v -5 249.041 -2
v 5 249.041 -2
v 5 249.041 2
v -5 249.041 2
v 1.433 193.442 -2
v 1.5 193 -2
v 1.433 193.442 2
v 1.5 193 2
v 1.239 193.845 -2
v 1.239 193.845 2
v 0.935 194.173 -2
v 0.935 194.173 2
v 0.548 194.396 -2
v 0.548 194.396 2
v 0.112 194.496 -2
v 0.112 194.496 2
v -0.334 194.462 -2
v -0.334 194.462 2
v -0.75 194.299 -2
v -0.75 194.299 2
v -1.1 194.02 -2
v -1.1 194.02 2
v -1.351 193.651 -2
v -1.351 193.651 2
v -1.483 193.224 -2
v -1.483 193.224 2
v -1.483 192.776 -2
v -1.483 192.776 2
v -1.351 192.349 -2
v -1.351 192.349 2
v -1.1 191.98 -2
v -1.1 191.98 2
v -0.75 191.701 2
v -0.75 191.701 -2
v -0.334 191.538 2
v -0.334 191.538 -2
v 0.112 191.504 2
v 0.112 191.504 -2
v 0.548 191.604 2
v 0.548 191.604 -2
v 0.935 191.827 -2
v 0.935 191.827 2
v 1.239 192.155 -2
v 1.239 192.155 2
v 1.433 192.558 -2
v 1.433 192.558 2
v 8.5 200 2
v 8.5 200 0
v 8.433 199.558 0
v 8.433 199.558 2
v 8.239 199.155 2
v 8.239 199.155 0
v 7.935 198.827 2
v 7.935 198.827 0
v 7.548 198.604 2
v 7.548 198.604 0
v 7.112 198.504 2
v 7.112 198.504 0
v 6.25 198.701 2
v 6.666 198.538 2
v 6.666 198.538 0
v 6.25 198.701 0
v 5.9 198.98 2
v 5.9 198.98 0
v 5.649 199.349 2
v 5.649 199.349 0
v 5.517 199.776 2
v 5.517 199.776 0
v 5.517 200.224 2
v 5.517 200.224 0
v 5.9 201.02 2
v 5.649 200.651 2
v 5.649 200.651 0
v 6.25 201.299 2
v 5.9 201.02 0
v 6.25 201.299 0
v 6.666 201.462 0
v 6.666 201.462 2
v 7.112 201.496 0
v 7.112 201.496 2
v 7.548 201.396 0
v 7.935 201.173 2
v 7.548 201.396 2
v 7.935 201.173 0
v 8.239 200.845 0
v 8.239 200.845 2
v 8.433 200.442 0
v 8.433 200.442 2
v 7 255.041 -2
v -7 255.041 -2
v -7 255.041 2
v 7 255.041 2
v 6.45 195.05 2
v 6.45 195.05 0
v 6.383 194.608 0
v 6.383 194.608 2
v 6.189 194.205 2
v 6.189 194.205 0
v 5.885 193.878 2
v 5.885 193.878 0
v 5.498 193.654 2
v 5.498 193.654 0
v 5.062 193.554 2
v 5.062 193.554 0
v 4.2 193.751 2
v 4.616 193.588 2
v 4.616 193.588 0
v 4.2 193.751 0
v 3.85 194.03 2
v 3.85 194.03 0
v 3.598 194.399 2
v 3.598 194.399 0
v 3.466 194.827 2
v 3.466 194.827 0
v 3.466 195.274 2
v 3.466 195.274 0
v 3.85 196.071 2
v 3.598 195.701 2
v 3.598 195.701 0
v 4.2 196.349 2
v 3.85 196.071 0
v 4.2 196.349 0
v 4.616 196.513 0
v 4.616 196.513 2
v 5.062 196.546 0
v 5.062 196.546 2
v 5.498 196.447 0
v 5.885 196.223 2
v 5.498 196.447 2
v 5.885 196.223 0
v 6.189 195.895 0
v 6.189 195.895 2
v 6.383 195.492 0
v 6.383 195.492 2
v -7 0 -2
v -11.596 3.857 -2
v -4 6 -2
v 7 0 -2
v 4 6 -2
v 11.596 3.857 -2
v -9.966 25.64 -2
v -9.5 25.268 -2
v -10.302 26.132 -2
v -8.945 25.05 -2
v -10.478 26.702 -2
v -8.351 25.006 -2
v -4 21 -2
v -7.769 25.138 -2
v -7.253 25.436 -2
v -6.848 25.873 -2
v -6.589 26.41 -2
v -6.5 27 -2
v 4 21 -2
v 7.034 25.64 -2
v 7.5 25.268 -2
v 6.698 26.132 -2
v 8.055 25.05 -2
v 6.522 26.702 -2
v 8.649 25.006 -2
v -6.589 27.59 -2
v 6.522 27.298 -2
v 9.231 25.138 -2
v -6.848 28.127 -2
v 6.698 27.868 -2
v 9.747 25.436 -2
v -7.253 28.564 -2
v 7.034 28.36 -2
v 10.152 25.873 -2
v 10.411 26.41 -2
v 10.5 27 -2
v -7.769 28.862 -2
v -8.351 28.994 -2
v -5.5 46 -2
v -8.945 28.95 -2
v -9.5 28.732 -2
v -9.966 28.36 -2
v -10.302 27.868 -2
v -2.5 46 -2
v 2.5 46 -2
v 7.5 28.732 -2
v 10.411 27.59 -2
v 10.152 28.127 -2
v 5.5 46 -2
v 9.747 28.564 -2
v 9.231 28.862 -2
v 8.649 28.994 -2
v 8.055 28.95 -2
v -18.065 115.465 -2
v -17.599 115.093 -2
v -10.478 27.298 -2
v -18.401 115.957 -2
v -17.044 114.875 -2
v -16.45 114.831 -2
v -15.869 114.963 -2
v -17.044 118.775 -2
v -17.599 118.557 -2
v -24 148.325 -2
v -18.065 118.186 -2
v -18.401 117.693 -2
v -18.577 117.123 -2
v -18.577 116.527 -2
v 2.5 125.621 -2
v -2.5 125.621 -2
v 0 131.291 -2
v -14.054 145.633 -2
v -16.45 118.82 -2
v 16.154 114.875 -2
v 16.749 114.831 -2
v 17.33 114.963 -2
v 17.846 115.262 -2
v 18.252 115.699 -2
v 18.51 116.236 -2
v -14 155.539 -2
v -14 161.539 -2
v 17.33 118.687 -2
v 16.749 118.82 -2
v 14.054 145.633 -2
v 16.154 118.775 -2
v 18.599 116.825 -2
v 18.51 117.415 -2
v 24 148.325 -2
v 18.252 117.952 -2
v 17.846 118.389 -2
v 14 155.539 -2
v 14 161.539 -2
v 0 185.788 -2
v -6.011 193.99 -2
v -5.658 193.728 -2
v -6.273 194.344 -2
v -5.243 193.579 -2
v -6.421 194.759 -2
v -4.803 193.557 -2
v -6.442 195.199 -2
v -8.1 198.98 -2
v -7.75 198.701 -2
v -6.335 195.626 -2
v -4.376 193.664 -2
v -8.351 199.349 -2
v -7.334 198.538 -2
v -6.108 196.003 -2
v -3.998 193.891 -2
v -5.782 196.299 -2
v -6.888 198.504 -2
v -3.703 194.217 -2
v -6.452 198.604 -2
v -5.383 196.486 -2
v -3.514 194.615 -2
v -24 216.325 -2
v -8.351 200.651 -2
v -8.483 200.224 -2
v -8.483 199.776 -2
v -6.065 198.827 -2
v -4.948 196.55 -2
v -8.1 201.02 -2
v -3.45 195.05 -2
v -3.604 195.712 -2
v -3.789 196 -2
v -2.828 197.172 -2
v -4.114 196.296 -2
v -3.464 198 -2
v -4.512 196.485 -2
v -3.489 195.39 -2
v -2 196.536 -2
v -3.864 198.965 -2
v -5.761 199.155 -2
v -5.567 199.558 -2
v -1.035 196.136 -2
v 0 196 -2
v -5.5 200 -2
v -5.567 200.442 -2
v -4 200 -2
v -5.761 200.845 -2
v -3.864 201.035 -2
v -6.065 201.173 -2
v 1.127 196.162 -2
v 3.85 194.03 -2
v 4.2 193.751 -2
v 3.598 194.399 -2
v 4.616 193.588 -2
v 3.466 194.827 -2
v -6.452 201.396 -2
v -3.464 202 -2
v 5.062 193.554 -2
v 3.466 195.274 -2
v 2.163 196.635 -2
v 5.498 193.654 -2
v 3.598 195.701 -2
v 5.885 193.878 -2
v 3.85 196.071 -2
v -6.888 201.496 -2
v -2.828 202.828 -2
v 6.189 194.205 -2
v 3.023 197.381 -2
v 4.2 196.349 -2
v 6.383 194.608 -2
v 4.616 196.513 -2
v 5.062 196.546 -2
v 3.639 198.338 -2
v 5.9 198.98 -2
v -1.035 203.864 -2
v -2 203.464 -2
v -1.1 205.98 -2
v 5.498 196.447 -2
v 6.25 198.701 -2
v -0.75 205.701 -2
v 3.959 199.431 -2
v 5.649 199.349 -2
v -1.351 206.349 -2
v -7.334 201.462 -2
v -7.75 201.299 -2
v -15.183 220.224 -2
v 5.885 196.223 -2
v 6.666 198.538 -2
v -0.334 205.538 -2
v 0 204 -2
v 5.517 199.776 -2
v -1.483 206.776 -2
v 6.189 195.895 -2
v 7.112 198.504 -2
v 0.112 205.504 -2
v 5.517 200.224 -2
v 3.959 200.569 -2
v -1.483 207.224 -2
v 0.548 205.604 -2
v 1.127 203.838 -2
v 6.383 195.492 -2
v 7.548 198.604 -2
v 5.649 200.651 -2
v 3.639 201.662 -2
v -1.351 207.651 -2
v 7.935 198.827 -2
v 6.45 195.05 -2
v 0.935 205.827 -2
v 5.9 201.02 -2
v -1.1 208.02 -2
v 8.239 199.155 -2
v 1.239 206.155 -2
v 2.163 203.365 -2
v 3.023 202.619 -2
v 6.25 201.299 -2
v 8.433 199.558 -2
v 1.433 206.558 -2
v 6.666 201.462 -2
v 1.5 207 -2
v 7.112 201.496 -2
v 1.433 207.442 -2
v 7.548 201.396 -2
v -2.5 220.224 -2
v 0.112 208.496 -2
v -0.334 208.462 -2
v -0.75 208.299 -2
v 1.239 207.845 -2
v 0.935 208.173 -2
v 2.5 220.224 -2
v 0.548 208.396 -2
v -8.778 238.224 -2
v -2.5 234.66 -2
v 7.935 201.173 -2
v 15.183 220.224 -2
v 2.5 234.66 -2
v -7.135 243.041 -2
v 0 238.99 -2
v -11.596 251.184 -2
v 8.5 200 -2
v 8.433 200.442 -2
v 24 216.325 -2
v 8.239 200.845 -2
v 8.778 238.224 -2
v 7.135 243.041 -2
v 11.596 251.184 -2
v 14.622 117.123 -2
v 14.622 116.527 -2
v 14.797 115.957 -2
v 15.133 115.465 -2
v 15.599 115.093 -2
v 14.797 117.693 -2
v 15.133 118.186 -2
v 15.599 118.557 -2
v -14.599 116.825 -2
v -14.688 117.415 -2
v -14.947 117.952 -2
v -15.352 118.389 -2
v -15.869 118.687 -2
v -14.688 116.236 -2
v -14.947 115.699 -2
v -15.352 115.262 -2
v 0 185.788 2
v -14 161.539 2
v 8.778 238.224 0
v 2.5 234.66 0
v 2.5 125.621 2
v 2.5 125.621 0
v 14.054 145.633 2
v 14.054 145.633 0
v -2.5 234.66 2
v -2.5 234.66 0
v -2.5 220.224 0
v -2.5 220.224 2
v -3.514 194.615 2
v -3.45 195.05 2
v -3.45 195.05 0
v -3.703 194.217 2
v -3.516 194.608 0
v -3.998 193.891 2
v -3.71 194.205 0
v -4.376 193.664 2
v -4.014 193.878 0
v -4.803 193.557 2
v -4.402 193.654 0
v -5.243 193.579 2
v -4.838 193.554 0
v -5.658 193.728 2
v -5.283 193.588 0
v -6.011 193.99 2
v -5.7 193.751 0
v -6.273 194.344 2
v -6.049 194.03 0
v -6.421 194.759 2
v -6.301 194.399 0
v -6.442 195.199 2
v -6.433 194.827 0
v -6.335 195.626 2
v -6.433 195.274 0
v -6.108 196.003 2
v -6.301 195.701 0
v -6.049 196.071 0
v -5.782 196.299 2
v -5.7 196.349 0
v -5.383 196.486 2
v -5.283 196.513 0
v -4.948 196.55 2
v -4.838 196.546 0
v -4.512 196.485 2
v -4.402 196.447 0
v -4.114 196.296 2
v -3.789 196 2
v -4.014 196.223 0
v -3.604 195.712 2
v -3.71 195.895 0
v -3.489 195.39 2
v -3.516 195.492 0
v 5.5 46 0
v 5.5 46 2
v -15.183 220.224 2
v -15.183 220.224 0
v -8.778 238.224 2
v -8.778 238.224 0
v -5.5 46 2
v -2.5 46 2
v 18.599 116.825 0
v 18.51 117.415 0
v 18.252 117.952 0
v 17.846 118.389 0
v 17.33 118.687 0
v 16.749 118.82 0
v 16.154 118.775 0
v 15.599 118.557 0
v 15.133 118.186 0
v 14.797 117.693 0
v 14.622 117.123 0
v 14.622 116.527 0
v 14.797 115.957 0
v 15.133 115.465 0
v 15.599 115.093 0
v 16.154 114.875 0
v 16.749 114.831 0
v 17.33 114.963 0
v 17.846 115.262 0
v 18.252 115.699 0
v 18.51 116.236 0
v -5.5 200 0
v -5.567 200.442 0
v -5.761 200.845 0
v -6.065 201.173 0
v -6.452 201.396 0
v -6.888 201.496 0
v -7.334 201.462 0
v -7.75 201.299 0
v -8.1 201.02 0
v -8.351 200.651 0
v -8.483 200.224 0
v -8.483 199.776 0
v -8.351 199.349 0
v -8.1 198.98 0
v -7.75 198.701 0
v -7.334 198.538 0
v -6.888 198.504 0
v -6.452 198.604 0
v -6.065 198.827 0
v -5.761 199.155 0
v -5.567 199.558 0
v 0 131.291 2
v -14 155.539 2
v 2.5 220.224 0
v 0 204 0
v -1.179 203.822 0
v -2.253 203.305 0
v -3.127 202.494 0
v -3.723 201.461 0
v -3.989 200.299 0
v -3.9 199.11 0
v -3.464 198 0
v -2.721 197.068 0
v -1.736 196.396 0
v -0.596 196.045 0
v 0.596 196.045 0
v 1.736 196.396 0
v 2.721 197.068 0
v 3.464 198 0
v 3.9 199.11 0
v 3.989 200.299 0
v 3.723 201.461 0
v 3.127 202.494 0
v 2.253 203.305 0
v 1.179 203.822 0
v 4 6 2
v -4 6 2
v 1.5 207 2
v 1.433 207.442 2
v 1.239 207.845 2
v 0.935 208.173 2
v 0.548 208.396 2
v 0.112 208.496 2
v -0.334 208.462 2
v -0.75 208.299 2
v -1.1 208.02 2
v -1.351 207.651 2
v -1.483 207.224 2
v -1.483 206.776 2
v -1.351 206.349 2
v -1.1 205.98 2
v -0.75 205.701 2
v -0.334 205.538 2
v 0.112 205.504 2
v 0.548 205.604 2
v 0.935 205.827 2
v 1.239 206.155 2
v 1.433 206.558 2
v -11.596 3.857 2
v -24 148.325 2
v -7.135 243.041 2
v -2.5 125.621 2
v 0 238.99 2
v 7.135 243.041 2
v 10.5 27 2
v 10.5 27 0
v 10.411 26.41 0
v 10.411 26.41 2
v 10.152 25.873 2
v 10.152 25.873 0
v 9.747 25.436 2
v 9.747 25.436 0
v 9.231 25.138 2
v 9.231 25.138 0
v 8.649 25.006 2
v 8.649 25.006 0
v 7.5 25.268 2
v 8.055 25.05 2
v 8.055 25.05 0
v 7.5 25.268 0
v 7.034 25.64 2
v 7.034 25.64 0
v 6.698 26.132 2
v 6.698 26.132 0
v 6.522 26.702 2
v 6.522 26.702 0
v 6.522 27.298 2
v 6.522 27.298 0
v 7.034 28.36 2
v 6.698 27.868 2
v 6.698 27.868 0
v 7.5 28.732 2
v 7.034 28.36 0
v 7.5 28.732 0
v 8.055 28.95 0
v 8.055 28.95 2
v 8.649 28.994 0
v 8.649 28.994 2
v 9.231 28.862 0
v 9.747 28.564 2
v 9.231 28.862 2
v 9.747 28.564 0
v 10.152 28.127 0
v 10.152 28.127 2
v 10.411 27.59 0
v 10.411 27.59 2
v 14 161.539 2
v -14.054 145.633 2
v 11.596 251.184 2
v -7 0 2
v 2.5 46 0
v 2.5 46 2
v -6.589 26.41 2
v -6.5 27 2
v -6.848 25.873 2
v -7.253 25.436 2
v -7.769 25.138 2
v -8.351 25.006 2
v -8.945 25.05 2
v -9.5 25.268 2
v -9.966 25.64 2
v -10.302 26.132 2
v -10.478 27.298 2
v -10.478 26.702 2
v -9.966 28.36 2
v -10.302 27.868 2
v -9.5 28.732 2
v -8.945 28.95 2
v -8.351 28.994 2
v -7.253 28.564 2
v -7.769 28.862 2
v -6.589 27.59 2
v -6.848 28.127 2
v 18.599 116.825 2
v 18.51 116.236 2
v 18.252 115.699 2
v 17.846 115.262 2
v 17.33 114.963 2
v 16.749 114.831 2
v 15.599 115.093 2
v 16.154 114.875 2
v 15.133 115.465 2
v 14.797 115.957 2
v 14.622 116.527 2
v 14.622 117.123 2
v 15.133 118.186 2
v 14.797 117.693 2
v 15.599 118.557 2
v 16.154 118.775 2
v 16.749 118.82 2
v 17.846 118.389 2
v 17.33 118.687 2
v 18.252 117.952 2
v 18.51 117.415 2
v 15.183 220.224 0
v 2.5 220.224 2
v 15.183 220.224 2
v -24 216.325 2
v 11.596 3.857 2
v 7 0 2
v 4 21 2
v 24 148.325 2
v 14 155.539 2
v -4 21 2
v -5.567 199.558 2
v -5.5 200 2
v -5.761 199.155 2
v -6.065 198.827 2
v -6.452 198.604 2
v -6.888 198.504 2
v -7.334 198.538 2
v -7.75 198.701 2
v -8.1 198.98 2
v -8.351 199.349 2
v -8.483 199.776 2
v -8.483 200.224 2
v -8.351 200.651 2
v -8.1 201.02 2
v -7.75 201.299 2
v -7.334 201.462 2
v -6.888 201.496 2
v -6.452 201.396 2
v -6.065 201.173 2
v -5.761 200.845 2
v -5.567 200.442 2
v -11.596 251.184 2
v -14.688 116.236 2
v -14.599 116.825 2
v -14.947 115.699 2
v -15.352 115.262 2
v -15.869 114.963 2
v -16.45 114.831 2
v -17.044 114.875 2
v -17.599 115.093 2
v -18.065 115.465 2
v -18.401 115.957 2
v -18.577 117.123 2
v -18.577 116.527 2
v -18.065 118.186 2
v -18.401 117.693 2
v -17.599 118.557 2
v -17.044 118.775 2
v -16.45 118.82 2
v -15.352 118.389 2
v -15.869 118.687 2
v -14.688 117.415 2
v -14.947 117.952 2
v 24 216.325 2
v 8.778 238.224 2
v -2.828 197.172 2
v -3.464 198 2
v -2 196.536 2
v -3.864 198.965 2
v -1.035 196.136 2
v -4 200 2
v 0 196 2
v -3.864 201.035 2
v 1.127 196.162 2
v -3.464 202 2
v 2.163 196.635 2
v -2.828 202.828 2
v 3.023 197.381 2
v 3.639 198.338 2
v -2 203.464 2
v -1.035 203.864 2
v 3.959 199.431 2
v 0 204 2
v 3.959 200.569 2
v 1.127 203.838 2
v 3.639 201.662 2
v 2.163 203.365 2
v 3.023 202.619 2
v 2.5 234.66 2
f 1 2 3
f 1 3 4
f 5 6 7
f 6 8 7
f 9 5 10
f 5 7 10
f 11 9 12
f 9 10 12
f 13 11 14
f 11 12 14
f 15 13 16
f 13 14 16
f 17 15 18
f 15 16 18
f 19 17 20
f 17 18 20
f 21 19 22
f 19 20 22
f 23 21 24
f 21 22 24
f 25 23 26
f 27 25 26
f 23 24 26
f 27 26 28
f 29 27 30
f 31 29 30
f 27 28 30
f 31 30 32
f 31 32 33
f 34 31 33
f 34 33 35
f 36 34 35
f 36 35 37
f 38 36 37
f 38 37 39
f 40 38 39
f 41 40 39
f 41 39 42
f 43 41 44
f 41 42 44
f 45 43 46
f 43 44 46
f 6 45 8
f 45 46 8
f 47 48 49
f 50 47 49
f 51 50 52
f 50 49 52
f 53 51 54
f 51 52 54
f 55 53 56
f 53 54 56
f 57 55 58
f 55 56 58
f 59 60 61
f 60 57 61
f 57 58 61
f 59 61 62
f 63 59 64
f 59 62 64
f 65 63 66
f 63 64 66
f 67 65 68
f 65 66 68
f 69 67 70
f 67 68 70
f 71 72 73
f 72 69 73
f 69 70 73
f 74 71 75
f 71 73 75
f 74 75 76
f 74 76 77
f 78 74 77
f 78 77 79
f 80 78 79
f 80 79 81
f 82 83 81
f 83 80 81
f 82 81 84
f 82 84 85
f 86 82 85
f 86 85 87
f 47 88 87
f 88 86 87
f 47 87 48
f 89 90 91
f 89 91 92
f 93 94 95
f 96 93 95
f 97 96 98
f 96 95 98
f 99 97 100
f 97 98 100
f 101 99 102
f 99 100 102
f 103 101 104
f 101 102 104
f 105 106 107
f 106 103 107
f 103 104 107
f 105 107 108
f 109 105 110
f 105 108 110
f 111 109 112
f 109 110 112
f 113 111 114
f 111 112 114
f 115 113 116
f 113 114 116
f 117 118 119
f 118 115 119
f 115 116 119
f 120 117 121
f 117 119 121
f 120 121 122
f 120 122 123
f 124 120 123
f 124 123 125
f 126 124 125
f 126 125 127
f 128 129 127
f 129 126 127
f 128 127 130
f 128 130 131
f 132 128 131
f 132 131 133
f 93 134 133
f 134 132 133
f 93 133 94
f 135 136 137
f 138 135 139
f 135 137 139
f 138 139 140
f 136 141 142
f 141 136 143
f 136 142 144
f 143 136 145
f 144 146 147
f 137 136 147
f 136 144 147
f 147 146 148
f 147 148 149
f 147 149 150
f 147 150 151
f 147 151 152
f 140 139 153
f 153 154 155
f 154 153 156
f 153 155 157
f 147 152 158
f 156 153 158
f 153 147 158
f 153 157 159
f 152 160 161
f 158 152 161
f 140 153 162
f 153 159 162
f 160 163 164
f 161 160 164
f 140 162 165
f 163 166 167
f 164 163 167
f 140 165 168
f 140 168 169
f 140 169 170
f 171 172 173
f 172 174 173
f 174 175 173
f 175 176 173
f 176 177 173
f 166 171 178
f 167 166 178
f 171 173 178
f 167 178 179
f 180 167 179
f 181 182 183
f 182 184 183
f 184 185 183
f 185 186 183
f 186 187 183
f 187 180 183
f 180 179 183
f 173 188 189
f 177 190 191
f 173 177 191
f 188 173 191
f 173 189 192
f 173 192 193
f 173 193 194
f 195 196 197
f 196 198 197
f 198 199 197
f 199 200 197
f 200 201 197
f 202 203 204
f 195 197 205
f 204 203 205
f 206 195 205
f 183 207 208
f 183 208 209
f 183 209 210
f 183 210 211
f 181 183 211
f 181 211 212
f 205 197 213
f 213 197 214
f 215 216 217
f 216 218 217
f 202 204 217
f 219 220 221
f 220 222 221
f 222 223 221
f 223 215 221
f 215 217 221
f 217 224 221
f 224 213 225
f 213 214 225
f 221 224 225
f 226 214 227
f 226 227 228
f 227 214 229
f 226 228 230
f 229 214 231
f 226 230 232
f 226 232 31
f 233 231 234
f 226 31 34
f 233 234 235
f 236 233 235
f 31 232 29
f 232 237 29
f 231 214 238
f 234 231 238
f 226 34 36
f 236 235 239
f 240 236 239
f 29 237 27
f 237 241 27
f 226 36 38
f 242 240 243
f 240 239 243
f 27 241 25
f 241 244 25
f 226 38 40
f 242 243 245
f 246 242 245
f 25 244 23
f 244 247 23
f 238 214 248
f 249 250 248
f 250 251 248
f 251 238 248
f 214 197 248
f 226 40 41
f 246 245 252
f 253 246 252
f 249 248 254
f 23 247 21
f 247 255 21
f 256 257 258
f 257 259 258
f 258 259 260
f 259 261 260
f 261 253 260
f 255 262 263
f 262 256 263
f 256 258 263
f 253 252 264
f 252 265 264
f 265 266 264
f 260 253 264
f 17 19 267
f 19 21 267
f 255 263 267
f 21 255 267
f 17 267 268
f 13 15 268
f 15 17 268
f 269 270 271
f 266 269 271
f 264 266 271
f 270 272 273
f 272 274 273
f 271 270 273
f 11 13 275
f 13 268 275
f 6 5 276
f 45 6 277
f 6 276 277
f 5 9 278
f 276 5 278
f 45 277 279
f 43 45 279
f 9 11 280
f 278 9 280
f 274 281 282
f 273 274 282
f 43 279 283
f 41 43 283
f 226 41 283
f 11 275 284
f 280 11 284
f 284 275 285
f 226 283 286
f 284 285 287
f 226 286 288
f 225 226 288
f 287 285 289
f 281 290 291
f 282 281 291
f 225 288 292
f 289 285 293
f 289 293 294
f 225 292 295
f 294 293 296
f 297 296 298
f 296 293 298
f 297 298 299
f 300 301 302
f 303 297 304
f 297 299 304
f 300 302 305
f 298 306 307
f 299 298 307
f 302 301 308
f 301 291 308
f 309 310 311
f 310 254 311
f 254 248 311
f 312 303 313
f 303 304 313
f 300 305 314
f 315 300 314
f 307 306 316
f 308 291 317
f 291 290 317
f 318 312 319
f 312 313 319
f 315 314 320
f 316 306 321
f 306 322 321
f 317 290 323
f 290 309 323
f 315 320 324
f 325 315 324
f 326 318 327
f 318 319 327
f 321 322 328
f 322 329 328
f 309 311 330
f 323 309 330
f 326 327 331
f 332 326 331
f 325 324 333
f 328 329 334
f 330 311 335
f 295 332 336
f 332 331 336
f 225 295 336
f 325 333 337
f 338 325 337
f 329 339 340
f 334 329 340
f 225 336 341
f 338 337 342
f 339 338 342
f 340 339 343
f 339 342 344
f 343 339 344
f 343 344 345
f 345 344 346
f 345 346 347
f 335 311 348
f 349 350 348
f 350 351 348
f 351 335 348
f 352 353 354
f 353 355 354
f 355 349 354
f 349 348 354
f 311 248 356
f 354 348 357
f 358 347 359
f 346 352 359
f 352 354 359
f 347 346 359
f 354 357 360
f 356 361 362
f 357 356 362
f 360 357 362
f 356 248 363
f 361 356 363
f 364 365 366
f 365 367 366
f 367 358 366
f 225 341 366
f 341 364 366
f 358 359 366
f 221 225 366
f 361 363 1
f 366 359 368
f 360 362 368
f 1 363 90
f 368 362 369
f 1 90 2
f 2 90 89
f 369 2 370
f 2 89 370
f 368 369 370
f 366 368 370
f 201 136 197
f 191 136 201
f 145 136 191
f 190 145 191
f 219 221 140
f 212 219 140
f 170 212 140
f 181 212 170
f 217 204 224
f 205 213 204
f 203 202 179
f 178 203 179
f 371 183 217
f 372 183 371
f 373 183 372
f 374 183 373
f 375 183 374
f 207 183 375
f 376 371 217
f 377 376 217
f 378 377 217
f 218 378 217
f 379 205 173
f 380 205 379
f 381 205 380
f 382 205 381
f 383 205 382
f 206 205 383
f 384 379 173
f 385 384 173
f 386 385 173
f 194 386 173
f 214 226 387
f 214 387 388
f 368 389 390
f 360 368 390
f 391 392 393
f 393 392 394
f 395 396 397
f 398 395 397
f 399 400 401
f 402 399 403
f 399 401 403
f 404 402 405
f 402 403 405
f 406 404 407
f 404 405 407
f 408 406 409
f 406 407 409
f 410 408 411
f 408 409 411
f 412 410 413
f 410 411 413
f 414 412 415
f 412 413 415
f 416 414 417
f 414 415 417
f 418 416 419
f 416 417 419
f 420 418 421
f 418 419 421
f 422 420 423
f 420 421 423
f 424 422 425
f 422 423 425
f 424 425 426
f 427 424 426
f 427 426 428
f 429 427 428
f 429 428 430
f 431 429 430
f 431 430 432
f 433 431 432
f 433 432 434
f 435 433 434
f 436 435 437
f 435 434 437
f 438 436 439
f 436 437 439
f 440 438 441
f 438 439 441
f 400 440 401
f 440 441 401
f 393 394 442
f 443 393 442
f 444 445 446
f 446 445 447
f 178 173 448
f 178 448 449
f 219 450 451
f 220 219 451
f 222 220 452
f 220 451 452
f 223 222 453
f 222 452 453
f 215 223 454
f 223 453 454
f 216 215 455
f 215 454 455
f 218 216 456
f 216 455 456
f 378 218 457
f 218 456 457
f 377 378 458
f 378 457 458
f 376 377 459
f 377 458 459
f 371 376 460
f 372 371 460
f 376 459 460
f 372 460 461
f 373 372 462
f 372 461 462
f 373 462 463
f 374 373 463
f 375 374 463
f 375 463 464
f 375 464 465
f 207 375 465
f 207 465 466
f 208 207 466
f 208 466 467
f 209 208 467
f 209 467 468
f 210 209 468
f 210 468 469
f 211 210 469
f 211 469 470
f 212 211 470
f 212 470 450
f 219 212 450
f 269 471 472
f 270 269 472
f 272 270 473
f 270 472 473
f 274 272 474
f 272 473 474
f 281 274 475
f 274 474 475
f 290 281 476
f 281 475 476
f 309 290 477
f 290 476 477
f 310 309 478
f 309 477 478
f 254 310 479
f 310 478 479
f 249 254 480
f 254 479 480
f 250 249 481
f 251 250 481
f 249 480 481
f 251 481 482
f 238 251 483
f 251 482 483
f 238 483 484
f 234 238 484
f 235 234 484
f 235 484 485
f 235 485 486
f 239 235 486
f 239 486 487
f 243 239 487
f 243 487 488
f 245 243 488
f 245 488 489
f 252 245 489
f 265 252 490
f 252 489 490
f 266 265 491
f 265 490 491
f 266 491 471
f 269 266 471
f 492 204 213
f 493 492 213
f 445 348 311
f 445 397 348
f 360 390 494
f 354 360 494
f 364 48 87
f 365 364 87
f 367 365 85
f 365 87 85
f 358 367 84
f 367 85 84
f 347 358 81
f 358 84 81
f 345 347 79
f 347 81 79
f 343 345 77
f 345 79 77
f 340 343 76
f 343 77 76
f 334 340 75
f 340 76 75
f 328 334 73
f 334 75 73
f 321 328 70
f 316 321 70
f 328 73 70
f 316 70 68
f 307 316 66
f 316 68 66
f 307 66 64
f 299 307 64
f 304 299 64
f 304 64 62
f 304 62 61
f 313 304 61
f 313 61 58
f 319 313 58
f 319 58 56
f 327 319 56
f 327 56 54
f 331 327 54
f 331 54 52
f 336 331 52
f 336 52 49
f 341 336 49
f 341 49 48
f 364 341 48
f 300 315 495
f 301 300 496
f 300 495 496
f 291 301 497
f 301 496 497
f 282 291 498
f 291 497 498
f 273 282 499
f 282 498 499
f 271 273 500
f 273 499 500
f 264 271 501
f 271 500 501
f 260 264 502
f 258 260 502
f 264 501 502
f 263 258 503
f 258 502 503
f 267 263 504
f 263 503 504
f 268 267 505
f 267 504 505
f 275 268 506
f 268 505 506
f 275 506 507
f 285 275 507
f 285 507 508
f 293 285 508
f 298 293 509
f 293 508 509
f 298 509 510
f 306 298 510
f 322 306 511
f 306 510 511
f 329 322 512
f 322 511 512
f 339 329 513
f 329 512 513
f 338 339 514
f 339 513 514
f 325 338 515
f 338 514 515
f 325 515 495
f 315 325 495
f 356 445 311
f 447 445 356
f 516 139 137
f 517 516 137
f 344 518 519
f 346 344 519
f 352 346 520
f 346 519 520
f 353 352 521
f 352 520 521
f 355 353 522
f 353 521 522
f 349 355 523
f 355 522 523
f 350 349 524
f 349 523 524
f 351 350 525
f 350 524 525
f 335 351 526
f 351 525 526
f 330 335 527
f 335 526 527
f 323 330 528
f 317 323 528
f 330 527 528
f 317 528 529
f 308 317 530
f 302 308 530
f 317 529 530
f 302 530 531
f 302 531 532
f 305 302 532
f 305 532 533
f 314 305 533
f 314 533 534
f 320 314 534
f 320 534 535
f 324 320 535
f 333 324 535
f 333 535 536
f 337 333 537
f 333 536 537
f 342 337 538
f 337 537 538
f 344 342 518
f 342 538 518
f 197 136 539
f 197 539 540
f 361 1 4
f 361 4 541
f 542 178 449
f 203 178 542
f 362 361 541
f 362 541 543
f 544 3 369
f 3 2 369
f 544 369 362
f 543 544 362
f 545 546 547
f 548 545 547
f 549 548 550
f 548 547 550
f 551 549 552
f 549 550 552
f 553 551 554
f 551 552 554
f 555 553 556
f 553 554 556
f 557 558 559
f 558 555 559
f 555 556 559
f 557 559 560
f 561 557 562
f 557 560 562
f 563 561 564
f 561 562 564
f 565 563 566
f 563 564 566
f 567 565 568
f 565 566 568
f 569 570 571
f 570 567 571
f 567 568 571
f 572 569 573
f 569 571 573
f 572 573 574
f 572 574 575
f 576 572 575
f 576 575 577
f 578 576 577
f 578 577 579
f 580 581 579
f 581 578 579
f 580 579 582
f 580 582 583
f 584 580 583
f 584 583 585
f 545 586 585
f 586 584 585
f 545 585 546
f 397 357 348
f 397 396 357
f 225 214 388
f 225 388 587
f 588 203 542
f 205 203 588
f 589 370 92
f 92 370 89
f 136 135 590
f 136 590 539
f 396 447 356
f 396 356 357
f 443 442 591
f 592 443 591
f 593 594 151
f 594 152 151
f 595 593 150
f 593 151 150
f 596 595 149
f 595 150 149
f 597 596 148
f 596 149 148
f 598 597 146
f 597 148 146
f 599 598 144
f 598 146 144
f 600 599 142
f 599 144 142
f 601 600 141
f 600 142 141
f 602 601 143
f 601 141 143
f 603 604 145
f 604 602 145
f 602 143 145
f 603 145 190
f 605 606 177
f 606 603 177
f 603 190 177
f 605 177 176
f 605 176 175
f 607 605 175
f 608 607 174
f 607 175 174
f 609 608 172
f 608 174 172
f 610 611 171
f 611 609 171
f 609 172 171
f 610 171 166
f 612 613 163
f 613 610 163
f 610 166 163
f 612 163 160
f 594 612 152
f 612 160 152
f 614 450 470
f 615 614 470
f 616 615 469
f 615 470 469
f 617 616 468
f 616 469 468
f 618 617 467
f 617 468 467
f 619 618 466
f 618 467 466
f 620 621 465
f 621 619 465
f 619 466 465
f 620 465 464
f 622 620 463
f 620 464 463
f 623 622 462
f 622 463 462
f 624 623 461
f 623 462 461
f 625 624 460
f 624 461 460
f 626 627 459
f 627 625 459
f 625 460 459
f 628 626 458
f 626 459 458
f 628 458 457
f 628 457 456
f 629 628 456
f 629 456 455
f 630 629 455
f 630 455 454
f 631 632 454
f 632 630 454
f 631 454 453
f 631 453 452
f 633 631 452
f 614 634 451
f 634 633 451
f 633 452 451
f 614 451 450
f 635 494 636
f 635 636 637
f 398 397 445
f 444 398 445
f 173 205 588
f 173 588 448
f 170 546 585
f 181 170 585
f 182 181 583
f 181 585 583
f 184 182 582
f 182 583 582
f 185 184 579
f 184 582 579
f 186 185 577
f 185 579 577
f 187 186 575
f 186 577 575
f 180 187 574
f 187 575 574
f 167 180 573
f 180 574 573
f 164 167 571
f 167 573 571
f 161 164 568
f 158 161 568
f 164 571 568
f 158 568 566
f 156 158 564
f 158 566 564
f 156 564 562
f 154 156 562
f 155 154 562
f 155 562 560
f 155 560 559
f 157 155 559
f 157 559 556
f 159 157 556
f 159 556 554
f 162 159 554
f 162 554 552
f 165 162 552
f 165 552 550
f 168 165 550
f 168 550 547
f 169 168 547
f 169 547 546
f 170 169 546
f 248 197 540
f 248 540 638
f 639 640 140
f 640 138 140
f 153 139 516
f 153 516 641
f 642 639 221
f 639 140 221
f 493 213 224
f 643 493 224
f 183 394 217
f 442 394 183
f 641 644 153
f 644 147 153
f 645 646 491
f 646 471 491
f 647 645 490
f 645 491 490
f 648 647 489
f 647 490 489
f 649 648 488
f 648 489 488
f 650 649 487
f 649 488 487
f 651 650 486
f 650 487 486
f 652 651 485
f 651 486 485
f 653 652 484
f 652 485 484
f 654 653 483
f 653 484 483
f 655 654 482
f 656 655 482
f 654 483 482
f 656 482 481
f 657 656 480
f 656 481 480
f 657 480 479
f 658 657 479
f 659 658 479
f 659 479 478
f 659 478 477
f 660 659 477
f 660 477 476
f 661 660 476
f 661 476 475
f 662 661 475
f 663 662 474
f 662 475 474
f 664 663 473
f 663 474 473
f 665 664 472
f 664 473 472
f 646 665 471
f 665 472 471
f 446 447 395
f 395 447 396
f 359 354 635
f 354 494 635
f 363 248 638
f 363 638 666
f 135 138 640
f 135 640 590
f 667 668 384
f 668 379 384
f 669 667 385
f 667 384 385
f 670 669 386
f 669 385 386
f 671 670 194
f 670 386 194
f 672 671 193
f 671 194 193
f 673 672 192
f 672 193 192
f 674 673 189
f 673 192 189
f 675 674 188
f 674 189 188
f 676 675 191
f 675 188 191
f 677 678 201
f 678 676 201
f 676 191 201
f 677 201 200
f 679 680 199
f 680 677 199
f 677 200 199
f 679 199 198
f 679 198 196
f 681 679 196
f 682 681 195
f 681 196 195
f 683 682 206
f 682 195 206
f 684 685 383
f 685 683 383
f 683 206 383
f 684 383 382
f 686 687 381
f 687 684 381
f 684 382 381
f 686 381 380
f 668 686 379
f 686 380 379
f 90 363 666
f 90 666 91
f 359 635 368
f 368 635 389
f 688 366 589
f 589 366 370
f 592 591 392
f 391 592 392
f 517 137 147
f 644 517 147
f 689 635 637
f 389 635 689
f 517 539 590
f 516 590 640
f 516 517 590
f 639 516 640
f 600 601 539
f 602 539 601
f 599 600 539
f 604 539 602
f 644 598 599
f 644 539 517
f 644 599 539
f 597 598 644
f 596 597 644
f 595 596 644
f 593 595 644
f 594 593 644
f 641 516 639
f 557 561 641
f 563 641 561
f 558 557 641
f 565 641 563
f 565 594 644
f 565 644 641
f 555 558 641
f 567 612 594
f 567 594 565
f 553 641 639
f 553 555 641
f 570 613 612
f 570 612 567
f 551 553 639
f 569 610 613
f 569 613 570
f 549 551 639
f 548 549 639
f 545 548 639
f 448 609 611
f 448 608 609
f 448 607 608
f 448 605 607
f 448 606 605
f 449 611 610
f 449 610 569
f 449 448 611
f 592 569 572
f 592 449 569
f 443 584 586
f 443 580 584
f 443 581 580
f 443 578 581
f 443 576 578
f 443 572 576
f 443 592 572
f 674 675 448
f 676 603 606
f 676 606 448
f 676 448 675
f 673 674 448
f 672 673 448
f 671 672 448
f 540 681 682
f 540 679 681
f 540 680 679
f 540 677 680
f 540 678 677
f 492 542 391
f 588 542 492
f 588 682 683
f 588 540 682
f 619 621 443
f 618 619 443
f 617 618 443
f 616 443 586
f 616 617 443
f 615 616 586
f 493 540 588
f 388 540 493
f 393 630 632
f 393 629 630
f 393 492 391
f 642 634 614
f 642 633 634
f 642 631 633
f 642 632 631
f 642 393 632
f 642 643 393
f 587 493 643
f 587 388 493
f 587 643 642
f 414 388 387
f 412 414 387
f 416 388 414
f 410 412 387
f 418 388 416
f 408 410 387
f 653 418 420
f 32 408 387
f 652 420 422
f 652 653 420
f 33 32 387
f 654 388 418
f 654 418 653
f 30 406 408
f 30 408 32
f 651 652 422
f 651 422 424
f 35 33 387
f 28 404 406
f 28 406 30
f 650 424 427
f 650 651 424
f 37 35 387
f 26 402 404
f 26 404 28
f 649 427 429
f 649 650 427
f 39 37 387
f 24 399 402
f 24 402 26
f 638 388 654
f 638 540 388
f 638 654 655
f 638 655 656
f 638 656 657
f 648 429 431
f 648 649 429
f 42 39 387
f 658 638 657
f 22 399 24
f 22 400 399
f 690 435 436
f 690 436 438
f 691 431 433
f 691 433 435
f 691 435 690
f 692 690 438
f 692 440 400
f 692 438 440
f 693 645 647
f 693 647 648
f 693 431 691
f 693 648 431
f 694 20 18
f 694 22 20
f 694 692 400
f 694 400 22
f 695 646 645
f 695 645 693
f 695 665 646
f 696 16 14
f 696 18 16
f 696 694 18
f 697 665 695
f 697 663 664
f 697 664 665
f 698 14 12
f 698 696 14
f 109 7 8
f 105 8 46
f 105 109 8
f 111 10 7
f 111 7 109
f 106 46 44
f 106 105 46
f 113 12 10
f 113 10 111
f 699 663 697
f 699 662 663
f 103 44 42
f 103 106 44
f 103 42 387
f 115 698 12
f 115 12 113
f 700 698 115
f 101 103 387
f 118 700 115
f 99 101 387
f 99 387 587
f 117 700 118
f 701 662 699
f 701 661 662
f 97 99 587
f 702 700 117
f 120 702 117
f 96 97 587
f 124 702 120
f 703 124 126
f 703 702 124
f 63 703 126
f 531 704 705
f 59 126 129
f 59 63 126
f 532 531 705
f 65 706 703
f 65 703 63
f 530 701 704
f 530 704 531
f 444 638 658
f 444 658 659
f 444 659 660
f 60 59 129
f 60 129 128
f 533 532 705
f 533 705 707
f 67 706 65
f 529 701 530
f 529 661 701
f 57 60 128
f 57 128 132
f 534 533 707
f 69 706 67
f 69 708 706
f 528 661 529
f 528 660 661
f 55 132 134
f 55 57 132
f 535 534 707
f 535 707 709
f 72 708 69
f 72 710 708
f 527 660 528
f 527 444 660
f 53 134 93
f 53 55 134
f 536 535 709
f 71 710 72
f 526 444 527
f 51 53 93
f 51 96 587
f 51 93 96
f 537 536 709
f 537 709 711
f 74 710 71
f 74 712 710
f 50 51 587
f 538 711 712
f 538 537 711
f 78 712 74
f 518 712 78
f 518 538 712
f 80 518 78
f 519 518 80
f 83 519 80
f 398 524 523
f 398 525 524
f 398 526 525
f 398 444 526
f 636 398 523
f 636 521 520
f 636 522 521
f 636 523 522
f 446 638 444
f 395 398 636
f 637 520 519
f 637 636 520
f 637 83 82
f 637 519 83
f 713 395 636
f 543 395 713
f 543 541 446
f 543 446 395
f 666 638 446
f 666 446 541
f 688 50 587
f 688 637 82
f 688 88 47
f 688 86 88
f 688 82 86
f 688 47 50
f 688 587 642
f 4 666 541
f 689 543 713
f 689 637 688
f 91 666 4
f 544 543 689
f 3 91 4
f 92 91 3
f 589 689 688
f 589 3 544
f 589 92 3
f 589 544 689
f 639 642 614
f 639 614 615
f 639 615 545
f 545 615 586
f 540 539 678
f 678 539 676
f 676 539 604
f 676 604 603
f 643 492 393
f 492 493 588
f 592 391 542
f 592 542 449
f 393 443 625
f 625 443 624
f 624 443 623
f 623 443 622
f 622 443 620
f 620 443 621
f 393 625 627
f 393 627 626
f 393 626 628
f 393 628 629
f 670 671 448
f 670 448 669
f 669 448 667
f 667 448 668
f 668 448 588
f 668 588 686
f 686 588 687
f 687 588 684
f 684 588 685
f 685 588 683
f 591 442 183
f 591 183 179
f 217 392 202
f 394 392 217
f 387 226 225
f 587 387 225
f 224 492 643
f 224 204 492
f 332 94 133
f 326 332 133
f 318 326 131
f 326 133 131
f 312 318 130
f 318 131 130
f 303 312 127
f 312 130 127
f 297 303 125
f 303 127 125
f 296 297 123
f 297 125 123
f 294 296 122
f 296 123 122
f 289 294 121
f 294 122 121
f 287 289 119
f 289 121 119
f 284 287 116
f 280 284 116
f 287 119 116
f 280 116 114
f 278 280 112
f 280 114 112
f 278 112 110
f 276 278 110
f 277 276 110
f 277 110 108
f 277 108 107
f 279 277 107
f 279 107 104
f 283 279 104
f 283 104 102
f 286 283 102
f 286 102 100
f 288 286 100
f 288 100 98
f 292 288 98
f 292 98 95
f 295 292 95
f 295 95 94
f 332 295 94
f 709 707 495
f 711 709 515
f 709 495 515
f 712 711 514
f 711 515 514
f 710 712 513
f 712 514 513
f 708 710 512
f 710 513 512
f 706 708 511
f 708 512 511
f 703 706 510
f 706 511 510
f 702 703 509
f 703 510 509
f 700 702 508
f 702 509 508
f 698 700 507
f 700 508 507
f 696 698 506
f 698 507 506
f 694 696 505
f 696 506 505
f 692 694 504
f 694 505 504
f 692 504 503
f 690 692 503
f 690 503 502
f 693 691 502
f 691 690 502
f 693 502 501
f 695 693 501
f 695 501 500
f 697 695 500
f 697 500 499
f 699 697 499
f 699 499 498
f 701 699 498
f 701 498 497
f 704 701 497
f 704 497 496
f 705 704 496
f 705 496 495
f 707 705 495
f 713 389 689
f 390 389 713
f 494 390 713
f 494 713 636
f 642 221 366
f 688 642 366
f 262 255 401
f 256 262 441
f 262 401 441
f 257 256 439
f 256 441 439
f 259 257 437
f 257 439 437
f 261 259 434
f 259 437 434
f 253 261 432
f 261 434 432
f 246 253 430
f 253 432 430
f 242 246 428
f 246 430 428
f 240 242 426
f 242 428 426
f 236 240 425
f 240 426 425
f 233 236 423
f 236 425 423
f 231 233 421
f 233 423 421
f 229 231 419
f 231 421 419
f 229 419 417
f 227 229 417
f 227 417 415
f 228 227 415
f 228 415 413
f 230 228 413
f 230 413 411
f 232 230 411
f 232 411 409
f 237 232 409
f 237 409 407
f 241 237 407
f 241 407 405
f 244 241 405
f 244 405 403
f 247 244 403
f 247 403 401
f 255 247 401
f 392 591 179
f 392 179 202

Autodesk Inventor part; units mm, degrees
ref_plane "YZ Plane" through (0, 0, 0) normal (1, 0, 0) x (0, 1, 0)
ref_plane "XZ Plane" through (0, 0, 0) normal (0, 1, 0) x (-1, 0, 0)
ref_plane "XY Plane" through (0, 0, 0) normal (0, 0, 1) x (1, 0, 0)
sketch "Sketch1" plane through (0, 0, 0) normal (0, 0, 1) x (1, 0, 0)
  line L0 (0, 0) -> (-7, 0)
  line L1 (-7, 0) -> (-11.5963, 3.8567)
  line L2 (-11.5963, 3.8567) -> (-24, 148.3252)
  line L3 (-24, 148.3252) -> (-24, 216.3252)
  line L4 (-24, 216.3252) -> (-11.5963, 251.1842)
  line L5 (-11.5963, 251.1842) -> (-7, 255.0409)
  line L6 (-7, 255.0409) -> (0, 255.0409)
  line L7 (0, 255.0409) -> (0, 0)
  line L8 (0, 6) -> (-4, 6)
  line L9 (-4, 6) -> (-4, 21)
  line L10 (-4, 21) -> (0, 21)
  line L11 (-5.5, 46) -> (-2.5, 46)
  line L12 (-2.5, 46) -> (-2.5, 125.6208)
  line L13 (-2.5, 125.6208) -> (-14.0543, 145.6334)
  line L14 (-14.0543, 145.6334) -> (-5.5, 46)
  line L15 (0, 249.0409) -> (-5, 249.0409)
  line L16 (-5, 249.0409) -> (-7.135, 243.0409)
  line L17 (-7.135, 243.0409) -> (0, 238.9899)
  line L18 (-8.7779, 238.224) -> (-2.5, 234.6596)
  line L19 (-2.5, 234.6596) -> (-2.5, 220.224)
  line L20 (-2.5, 220.224) -> (-15.1828, 220.224)
  line L21 (-15.1828, 220.224) -> (-8.7779, 238.224)
  line L22 (0, 131.2907) -> (-14, 155.5394)
  line L23 (-14, 155.5394) -> (0, 155.5394)
  arc A0 (0, 204) -> (0, 196) centre (0, 200) ccw
  circle A1 centre (-7, 200) radius 1.5
  line L24 (0, 0) -> (7, 0)
  line L25 (7, 0) -> (11.5963, 3.8567)
  line L26 (11.5963, 3.8567) -> (24, 148.3252)
  line L27 (24, 148.3252) -> (24, 216.3252)
  line L28 (24, 216.3252) -> (11.5963, 251.1842)
  line L29 (11.5963, 251.1842) -> (7, 255.0409)
  line L30 (7, 255.0409) -> (0, 255.0409)
  line L31 (0, 6) -> (4, 6)
  line L32 (4, 6) -> (4, 21)
  line L33 (4, 21) -> (0, 21)
  line L34 (5.5, 46) -> (2.5, 46)
  line L35 (2.5, 46) -> (2.5, 125.6208)
  line L36 (2.5, 125.6208) -> (14.0543, 145.6334)
  line L37 (14.0543, 145.6334) -> (5.5, 46)
  line L38 (0, 249.0409) -> (5, 249.0409)
  line L39 (5, 249.0409) -> (7.135, 243.0409)
  line L40 (7.135, 243.0409) -> (0, 238.9899)
  line L41 (8.7779, 238.224) -> (2.5, 234.6596)
  line L42 (2.5, 234.6596) -> (2.5, 220.224)
  line L43 (2.5, 220.224) -> (15.1828, 220.224)
  line L44 (15.1828, 220.224) -> (8.7779, 238.224)
  line L45 (0, 131.2907) -> (14, 155.5394)
  line L46 (14, 155.5394) -> (0, 155.5394)
  arc A2 (0, 196) -> (0, 204) centre (0, 200) ccw
  circle A3 centre (-16.5993, 116.8252) radius 2
  circle A4 centre (16.5993, 116.8252) radius 2
  circle A5 centre (-8.5, 27) radius 2
  circle A6 centre (8.5, 27) radius 2
  line L47 (0, 200) -> (-10, 200)
  line L48 (0, 204) -> (-14, 204)
  line L49 (0, 196) -> (-14, 196)
  circle A7 centre (-4.9497, 195.0503) radius 1.5
  circle A8 centre (0, 193) radius 1.5
  circle A9 centre (4.9497, 195.0503) radius 1.5
  circle A10 centre (7, 200) radius 1.5
  circle A11 centre (0, 207) radius 1.5
  line L50 (-24, 158.5394) -> (24, 158.5394)
  line L51 (0, 185.7881) -> (-14, 161.5394)
  line L52 (-14, 161.5394) -> (0, 161.5394)
  line L53 (14, 161.5394) -> (0, 161.5394)
  line L54 (0, 185.7881) -> (14, 161.5394)
  dimension "d0" = 7
  dimension "d1" = 6
  dimension "d2" = 145
  dimension "d3" = 68
  dimension "d4" = 37
  dimension "d5" = 48
  dimension "d8" = 140
  dimension "d9" = 140
  dimension "d10" = 15
  dimension "d11" = 6
  dimension "d12" = 4
  dimension "d13" = 3
  dimension "d14" = 5
  dimension "d15" = 25
  dimension "d17" = 100
  dimension "d19" = 5
  dimension "d20" = 28
  dimension "d21" = 150
  dimension "d29" = 6
  dimension "d32" = 6
  dimension "d33" = 4
  dimension "d38" = 3
  dimension "d42" = 4
  dimension "d43" = 31.5
  dimension "d45" = 5
  dimension "d46" = 4
  dimension "d47" = 17
  dimension "d48" = 6
  dimension "d51" = 200
  dimension "d54" = 3
  dimension "d56" = 14
  dimension "d57" = 8
  dimension "d58" = 7
  dimension "d61" = 180
  dimension "d63" = 5
  dimension "d64" = 5
  dimension "d65" = 100
  dimension "d66" = 7
  dimension "d67" = 5
  dimension "d68" = 18
  dimension "d69" = 6
extrude "Extrusion1" add sketch "Sketch1" along normal mid plane 4 contours L0 L1 L2 L3 L50 L7 L23 L22 L10 L9 L8 | L7 L31 L32 L33 L45 L46 L50 L27 L26 L25 L24 | L3 L4 L5 L6 L7 L15 L16 L17 A11 A0 A8 L51 L52 L50 | L50 L7 L53 L54 A8 A2 A11 L40 L39 L38 L30 L29 L28 L27 | L52 L51 L7 | L7 L54 L53 | A8 L7 | L7 A8 | A11 L7 | L7 A11
extrude "Extrusion2" cut sketch "Sketch1" along normal mid plane 10 contours L52 L51 L7 | L7 L54 L53 | A8 L7 | L7 A8 | A11 L7 | L7 A11
properties part number "Leg_part3"
